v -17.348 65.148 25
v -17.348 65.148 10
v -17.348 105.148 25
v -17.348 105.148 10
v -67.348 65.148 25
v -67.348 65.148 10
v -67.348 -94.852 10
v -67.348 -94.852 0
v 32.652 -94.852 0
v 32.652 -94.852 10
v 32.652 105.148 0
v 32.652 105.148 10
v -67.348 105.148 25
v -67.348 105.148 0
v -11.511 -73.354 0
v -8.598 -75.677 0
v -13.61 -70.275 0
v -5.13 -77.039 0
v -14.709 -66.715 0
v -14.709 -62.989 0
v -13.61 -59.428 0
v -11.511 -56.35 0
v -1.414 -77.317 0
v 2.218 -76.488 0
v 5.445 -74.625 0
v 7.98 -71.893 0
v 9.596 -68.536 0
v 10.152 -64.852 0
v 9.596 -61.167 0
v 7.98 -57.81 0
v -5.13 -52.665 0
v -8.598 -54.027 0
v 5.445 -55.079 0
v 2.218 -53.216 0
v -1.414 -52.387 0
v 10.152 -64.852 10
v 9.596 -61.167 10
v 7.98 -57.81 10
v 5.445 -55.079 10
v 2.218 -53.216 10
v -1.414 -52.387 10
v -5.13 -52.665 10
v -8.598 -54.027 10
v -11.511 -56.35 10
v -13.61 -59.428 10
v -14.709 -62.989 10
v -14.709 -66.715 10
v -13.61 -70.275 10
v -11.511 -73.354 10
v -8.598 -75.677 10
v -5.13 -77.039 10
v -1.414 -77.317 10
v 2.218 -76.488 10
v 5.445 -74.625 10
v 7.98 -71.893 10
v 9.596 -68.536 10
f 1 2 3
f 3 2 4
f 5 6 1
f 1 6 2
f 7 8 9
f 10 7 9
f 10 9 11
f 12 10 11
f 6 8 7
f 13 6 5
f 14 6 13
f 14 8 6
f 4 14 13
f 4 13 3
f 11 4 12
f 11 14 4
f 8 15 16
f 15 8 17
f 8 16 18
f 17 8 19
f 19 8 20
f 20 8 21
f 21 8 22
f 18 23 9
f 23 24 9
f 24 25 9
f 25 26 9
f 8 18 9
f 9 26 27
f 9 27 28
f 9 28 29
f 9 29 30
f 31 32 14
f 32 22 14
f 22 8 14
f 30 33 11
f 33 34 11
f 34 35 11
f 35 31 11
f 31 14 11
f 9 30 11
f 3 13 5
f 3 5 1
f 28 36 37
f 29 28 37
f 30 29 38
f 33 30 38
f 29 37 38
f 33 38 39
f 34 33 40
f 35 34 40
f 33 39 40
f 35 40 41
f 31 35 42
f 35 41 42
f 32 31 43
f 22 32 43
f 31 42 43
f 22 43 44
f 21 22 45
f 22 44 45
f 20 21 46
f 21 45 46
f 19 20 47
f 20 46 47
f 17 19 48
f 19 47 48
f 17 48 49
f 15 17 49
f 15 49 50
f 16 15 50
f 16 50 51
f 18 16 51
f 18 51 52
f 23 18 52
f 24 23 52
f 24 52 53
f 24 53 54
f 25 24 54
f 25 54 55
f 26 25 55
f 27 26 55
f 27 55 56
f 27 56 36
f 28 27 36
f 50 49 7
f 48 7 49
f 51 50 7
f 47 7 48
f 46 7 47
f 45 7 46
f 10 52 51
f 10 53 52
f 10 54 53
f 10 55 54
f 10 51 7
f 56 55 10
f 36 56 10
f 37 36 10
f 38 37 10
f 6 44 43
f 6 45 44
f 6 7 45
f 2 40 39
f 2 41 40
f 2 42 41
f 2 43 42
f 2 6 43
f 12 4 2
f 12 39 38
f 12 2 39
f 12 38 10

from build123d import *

# Parameters (mm, degrees)
F0_W     = 100
F0_H     = 200
F1_DEPTH = 10
F2_W     = 50
F2_H     = 40
F3_DEPTH = 25
F4_R     = 12.5
F5_DEPTH = 10.001


with BuildPart() as f1:
    # F0 (on Top) → F1 (new body)
    with BuildSketch(Plane.XY):
        with Locations((-17.348269, 5.148082)):
            Rectangle(F0_W, F0_H)
    extrude(amount=F1_DEPTH)

    # F2 (on Top) → F3 (join)
    with BuildSketch(Plane.XY):
        with Locations((-42.348269, 85.148082)):
            Rectangle(F2_W, F2_H)
    extrude(amount=F3_DEPTH)

    # F4 (on face) → F5 (cut, through all)
    with BuildSketch(Plane.XY.offset(10)):
        with Locations((-2.348269, -64.851918)):
            Circle(F4_R)
    extrude(amount=-F5_DEPTH, mode=Mode.SUBTRACT)


solid = f1.part
